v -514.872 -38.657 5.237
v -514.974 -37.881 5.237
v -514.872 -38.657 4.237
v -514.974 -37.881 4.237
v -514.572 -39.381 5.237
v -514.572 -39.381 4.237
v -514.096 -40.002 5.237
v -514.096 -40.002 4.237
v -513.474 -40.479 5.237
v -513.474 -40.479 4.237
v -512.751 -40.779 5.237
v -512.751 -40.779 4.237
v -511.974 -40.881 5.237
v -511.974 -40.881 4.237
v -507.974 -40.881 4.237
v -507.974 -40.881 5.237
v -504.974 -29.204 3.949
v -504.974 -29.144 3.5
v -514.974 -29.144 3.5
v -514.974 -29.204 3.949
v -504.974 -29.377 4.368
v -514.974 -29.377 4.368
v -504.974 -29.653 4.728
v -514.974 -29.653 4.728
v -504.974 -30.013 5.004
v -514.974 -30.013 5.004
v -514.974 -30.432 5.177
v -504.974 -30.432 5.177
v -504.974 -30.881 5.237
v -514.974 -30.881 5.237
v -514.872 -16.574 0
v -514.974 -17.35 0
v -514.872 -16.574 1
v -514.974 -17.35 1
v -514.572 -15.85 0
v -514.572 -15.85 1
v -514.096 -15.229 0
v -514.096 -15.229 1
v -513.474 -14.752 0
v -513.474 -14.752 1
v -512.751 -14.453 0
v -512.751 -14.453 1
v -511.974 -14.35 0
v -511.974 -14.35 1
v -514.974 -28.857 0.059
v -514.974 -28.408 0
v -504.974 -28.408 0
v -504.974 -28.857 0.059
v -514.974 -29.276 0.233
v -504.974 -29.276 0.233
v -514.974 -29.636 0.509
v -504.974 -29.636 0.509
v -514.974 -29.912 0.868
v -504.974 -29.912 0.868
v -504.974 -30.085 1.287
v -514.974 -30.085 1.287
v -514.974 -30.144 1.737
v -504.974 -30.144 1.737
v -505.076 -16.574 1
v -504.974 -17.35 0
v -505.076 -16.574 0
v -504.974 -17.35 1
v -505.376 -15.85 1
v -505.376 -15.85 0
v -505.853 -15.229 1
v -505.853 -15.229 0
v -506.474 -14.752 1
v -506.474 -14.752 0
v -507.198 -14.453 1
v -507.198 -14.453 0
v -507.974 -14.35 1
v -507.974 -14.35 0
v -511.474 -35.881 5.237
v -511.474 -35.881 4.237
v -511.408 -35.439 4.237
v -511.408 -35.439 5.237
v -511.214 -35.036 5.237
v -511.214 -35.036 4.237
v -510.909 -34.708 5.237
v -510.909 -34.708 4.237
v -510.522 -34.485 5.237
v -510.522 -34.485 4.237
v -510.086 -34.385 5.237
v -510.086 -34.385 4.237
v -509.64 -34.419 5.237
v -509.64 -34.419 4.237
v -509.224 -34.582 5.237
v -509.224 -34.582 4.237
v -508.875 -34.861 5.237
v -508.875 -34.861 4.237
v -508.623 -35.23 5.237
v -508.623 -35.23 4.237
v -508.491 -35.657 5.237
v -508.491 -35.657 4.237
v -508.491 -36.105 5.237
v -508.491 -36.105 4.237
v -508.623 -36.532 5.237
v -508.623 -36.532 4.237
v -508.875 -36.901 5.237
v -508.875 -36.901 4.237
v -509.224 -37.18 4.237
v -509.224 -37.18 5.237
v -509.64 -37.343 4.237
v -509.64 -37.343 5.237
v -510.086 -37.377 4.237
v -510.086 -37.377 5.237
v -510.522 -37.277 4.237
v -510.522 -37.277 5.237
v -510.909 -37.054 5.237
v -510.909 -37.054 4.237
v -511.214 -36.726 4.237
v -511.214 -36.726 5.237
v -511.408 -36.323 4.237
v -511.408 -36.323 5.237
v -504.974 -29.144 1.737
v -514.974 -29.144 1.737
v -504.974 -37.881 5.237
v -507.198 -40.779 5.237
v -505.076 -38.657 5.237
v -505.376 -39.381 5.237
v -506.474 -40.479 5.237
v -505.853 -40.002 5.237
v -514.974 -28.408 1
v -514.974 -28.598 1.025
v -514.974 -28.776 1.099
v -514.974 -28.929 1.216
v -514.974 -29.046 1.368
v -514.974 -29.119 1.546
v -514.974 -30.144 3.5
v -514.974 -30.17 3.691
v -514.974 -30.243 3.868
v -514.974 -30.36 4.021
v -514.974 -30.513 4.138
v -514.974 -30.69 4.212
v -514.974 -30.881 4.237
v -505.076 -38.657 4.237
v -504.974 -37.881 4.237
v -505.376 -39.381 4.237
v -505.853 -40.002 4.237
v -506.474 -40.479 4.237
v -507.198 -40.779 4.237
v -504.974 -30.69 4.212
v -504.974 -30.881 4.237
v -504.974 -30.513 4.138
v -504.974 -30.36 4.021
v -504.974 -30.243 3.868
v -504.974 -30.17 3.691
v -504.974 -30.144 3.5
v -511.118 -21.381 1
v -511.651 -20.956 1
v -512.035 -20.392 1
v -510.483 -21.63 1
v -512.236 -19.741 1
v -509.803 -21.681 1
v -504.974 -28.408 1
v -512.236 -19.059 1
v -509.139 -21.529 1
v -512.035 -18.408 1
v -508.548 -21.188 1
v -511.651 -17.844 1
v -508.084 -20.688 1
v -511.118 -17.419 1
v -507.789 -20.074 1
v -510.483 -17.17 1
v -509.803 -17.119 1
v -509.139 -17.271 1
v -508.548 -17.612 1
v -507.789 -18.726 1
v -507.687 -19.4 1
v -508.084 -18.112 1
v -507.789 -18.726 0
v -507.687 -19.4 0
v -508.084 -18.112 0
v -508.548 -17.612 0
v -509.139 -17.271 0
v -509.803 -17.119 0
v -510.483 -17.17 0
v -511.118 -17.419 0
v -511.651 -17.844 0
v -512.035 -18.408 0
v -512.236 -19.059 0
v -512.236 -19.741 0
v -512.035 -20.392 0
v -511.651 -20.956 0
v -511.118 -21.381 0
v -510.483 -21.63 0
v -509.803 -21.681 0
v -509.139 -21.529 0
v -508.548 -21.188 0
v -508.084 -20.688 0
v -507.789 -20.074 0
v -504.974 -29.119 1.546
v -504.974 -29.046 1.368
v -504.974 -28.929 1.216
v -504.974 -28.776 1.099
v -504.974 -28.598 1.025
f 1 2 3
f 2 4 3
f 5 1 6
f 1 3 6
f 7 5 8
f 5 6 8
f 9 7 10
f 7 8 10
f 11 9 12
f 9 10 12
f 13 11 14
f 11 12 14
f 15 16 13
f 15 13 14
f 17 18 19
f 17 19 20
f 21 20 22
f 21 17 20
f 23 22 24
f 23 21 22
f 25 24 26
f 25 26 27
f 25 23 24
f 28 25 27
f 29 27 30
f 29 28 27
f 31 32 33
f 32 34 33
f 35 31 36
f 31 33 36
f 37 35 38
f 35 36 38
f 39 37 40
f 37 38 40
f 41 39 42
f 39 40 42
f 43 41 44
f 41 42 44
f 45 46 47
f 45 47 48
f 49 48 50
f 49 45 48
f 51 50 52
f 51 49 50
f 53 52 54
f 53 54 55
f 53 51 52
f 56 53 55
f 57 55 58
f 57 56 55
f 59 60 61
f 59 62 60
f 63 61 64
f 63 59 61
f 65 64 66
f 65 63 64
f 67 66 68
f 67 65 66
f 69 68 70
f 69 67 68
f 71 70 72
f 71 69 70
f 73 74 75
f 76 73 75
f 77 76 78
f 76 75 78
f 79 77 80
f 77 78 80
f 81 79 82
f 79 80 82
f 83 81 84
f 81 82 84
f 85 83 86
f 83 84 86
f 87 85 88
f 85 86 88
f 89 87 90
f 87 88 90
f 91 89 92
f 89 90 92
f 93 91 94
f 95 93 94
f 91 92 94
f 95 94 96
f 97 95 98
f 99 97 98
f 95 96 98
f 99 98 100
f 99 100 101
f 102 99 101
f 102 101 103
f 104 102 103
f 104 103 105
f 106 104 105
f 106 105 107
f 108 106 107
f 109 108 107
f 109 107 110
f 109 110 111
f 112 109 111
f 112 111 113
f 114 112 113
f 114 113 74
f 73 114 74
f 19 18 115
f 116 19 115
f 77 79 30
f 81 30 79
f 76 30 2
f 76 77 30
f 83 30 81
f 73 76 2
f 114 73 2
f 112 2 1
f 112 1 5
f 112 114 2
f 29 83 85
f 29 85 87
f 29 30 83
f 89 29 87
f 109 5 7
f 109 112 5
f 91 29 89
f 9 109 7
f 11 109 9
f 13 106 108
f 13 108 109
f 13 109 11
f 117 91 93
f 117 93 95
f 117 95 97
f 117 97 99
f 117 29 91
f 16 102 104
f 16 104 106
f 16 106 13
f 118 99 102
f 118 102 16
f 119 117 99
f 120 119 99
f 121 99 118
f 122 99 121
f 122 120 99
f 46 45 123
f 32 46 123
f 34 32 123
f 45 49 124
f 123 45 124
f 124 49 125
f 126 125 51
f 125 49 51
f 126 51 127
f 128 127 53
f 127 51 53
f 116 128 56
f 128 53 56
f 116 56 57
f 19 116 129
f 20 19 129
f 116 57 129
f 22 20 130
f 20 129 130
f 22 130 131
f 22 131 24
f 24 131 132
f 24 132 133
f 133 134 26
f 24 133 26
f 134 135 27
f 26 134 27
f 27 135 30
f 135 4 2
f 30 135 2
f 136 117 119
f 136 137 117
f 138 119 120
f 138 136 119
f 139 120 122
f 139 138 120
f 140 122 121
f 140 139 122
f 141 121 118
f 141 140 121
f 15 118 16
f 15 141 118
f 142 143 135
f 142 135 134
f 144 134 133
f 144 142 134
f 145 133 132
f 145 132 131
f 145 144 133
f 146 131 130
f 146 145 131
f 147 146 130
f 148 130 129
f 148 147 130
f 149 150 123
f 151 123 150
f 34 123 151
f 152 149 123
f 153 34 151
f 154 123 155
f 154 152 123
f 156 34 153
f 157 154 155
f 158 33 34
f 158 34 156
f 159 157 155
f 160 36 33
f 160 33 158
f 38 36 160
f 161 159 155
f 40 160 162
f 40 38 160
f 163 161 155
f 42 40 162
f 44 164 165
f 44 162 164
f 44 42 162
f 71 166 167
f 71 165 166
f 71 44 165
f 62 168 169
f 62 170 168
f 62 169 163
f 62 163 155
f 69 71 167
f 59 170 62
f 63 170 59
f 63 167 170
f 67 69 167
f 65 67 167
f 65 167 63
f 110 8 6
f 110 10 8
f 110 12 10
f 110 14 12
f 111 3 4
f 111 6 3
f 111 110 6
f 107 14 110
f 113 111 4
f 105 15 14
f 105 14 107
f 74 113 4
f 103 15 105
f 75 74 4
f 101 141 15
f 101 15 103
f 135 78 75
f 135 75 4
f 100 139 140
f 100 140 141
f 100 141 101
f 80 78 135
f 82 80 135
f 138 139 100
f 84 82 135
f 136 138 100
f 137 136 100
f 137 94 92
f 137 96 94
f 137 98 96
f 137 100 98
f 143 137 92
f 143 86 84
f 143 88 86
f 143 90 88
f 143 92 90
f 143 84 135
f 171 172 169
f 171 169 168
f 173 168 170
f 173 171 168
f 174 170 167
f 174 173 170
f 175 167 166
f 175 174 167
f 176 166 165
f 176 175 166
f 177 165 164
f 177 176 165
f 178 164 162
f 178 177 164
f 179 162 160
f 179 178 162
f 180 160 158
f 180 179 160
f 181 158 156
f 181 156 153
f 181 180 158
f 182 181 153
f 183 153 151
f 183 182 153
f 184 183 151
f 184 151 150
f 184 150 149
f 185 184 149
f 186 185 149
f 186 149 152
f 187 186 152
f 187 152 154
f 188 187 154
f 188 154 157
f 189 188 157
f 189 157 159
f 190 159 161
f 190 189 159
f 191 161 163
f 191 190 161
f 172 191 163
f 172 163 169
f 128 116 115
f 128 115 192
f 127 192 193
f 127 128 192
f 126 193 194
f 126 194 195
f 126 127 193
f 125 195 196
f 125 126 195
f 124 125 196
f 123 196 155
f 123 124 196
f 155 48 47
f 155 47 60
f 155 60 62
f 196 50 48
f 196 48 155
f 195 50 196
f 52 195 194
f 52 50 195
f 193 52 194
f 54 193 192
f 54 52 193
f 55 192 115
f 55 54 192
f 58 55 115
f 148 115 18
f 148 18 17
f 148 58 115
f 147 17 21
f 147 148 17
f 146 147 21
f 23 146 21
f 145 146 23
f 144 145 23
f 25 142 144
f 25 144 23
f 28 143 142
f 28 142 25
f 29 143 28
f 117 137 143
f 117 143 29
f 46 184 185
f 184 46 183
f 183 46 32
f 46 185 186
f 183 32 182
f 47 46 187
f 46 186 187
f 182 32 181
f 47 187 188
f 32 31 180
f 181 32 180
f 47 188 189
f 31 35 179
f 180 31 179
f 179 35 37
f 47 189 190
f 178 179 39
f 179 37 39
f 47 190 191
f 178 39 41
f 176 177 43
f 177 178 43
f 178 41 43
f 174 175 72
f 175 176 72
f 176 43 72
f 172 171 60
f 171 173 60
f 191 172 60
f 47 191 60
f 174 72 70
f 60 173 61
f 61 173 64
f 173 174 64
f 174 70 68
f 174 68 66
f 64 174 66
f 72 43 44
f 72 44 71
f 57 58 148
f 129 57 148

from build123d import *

# Parameters (mm, degrees)
SKETCH1_W          = 10
SKETCH1_H          = 14.057527786
SKETCH1_R          = 2.287307526
BASE_FLANGE1_DEPTH = 1
EDGE_FLANGE1_DEPTH = 10
EDGE_FLANGE2_DEPTH = 10
SKETCH12_R         = 1.5
CUT_EXTRUDE1_DEPTH = 2
FILLET1_R          = 3


# Sheet-metal steps are written as plain solids
with BuildPart() as part:
    # Sketch1 → Base-Flange1 (new body)
    with BuildSketch(Plane.XY):
        with Locations((-509.974194853, -21.379047402)):
            Rectangle(SKETCH1_W, SKETCH1_H)
        with Locations((-509.974194853, -19.4)):
            Circle(SKETCH1_R, mode=Mode.SUBTRACT)
    extrude(amount=BASE_FLANGE1_DEPTH)

    # Edge-Flange1 section (across the edge) → Edge-Flange1 (add)
    with BuildSketch(Plane(origin=(-514.974194853, -29.144411295, 1), x_dir=(0, 1, 0), z_dir=(1, 0, 0))):
        with BuildLine():
            Line((-1, 0.7366), (-1, 2.5))
            Line((-1, 2.5), (0, 2.5))
            Line((0, 2.5), (0, 0.7366))
            ThreePointArc((0, 0.7366), (0.215745145, 0.215745145), (0.7366, 0))
            Line((0.7366, 0), (0.7366, -1))
            ThreePointArc((0.7366, -1), (-0.491361636, -0.491361636), (-1, 0.7366))
        make_face()
    extrude(amount=EDGE_FLANGE1_DEPTH)

    # Edge-Flange2 section (across the edge) → Edge-Flange2 (add)
    with BuildSketch(Plane(origin=(-504.974194853, -30.144411295, 4.2366), x_dir=(0, 0, -1), z_dir=(-1, 0, 0))):
        with BuildLine():
            Line((-1, 0.7366), (-1, 10.7366))
            Line((-1, 10.7366), (0, 10.7366))
            Line((0, 10.7366), (0, 0.7366))
            ThreePointArc((0, 0.7366), (0.215745145, 0.215745145), (0.7366, 0))
            Line((0.7366, 0), (0.7366, -1))
            ThreePointArc((0.7366, -1), (-0.491361636, -0.491361636), (-1, 0.7366))
        make_face()
    extrude(amount=EDGE_FLANGE2_DEPTH)

    # Sketch12 → Cut-Extrude1 (cut)
    with BuildSketch(Plane(origin=(0, 0, 4.2366), x_dir=(-1, 0, 0), z_dir=(0, 0, -1))):
        with Locations((509.974194853, -35.881011295)):
            Circle(SKETCH12_R)
    extrude(amount=-CUT_EXTRUDE1_DEPTH, mode=Mode.SUBTRACT)

    # Fillet1
    fillet1_edges = [part.edges().sort_by_distance(p)[0] for p in [
        (-504.974194853, -40.881011295, 4.7366),
        (-514.974194853, -40.881011295, 4.7366),
        (-514.974194853, -14.350283509, 0.5),
        (-504.974194853, -14.350283509, 0.5),
    ]]
    fillet(fillet1_edges, radius=FILLET1_R)


solid = part.part
